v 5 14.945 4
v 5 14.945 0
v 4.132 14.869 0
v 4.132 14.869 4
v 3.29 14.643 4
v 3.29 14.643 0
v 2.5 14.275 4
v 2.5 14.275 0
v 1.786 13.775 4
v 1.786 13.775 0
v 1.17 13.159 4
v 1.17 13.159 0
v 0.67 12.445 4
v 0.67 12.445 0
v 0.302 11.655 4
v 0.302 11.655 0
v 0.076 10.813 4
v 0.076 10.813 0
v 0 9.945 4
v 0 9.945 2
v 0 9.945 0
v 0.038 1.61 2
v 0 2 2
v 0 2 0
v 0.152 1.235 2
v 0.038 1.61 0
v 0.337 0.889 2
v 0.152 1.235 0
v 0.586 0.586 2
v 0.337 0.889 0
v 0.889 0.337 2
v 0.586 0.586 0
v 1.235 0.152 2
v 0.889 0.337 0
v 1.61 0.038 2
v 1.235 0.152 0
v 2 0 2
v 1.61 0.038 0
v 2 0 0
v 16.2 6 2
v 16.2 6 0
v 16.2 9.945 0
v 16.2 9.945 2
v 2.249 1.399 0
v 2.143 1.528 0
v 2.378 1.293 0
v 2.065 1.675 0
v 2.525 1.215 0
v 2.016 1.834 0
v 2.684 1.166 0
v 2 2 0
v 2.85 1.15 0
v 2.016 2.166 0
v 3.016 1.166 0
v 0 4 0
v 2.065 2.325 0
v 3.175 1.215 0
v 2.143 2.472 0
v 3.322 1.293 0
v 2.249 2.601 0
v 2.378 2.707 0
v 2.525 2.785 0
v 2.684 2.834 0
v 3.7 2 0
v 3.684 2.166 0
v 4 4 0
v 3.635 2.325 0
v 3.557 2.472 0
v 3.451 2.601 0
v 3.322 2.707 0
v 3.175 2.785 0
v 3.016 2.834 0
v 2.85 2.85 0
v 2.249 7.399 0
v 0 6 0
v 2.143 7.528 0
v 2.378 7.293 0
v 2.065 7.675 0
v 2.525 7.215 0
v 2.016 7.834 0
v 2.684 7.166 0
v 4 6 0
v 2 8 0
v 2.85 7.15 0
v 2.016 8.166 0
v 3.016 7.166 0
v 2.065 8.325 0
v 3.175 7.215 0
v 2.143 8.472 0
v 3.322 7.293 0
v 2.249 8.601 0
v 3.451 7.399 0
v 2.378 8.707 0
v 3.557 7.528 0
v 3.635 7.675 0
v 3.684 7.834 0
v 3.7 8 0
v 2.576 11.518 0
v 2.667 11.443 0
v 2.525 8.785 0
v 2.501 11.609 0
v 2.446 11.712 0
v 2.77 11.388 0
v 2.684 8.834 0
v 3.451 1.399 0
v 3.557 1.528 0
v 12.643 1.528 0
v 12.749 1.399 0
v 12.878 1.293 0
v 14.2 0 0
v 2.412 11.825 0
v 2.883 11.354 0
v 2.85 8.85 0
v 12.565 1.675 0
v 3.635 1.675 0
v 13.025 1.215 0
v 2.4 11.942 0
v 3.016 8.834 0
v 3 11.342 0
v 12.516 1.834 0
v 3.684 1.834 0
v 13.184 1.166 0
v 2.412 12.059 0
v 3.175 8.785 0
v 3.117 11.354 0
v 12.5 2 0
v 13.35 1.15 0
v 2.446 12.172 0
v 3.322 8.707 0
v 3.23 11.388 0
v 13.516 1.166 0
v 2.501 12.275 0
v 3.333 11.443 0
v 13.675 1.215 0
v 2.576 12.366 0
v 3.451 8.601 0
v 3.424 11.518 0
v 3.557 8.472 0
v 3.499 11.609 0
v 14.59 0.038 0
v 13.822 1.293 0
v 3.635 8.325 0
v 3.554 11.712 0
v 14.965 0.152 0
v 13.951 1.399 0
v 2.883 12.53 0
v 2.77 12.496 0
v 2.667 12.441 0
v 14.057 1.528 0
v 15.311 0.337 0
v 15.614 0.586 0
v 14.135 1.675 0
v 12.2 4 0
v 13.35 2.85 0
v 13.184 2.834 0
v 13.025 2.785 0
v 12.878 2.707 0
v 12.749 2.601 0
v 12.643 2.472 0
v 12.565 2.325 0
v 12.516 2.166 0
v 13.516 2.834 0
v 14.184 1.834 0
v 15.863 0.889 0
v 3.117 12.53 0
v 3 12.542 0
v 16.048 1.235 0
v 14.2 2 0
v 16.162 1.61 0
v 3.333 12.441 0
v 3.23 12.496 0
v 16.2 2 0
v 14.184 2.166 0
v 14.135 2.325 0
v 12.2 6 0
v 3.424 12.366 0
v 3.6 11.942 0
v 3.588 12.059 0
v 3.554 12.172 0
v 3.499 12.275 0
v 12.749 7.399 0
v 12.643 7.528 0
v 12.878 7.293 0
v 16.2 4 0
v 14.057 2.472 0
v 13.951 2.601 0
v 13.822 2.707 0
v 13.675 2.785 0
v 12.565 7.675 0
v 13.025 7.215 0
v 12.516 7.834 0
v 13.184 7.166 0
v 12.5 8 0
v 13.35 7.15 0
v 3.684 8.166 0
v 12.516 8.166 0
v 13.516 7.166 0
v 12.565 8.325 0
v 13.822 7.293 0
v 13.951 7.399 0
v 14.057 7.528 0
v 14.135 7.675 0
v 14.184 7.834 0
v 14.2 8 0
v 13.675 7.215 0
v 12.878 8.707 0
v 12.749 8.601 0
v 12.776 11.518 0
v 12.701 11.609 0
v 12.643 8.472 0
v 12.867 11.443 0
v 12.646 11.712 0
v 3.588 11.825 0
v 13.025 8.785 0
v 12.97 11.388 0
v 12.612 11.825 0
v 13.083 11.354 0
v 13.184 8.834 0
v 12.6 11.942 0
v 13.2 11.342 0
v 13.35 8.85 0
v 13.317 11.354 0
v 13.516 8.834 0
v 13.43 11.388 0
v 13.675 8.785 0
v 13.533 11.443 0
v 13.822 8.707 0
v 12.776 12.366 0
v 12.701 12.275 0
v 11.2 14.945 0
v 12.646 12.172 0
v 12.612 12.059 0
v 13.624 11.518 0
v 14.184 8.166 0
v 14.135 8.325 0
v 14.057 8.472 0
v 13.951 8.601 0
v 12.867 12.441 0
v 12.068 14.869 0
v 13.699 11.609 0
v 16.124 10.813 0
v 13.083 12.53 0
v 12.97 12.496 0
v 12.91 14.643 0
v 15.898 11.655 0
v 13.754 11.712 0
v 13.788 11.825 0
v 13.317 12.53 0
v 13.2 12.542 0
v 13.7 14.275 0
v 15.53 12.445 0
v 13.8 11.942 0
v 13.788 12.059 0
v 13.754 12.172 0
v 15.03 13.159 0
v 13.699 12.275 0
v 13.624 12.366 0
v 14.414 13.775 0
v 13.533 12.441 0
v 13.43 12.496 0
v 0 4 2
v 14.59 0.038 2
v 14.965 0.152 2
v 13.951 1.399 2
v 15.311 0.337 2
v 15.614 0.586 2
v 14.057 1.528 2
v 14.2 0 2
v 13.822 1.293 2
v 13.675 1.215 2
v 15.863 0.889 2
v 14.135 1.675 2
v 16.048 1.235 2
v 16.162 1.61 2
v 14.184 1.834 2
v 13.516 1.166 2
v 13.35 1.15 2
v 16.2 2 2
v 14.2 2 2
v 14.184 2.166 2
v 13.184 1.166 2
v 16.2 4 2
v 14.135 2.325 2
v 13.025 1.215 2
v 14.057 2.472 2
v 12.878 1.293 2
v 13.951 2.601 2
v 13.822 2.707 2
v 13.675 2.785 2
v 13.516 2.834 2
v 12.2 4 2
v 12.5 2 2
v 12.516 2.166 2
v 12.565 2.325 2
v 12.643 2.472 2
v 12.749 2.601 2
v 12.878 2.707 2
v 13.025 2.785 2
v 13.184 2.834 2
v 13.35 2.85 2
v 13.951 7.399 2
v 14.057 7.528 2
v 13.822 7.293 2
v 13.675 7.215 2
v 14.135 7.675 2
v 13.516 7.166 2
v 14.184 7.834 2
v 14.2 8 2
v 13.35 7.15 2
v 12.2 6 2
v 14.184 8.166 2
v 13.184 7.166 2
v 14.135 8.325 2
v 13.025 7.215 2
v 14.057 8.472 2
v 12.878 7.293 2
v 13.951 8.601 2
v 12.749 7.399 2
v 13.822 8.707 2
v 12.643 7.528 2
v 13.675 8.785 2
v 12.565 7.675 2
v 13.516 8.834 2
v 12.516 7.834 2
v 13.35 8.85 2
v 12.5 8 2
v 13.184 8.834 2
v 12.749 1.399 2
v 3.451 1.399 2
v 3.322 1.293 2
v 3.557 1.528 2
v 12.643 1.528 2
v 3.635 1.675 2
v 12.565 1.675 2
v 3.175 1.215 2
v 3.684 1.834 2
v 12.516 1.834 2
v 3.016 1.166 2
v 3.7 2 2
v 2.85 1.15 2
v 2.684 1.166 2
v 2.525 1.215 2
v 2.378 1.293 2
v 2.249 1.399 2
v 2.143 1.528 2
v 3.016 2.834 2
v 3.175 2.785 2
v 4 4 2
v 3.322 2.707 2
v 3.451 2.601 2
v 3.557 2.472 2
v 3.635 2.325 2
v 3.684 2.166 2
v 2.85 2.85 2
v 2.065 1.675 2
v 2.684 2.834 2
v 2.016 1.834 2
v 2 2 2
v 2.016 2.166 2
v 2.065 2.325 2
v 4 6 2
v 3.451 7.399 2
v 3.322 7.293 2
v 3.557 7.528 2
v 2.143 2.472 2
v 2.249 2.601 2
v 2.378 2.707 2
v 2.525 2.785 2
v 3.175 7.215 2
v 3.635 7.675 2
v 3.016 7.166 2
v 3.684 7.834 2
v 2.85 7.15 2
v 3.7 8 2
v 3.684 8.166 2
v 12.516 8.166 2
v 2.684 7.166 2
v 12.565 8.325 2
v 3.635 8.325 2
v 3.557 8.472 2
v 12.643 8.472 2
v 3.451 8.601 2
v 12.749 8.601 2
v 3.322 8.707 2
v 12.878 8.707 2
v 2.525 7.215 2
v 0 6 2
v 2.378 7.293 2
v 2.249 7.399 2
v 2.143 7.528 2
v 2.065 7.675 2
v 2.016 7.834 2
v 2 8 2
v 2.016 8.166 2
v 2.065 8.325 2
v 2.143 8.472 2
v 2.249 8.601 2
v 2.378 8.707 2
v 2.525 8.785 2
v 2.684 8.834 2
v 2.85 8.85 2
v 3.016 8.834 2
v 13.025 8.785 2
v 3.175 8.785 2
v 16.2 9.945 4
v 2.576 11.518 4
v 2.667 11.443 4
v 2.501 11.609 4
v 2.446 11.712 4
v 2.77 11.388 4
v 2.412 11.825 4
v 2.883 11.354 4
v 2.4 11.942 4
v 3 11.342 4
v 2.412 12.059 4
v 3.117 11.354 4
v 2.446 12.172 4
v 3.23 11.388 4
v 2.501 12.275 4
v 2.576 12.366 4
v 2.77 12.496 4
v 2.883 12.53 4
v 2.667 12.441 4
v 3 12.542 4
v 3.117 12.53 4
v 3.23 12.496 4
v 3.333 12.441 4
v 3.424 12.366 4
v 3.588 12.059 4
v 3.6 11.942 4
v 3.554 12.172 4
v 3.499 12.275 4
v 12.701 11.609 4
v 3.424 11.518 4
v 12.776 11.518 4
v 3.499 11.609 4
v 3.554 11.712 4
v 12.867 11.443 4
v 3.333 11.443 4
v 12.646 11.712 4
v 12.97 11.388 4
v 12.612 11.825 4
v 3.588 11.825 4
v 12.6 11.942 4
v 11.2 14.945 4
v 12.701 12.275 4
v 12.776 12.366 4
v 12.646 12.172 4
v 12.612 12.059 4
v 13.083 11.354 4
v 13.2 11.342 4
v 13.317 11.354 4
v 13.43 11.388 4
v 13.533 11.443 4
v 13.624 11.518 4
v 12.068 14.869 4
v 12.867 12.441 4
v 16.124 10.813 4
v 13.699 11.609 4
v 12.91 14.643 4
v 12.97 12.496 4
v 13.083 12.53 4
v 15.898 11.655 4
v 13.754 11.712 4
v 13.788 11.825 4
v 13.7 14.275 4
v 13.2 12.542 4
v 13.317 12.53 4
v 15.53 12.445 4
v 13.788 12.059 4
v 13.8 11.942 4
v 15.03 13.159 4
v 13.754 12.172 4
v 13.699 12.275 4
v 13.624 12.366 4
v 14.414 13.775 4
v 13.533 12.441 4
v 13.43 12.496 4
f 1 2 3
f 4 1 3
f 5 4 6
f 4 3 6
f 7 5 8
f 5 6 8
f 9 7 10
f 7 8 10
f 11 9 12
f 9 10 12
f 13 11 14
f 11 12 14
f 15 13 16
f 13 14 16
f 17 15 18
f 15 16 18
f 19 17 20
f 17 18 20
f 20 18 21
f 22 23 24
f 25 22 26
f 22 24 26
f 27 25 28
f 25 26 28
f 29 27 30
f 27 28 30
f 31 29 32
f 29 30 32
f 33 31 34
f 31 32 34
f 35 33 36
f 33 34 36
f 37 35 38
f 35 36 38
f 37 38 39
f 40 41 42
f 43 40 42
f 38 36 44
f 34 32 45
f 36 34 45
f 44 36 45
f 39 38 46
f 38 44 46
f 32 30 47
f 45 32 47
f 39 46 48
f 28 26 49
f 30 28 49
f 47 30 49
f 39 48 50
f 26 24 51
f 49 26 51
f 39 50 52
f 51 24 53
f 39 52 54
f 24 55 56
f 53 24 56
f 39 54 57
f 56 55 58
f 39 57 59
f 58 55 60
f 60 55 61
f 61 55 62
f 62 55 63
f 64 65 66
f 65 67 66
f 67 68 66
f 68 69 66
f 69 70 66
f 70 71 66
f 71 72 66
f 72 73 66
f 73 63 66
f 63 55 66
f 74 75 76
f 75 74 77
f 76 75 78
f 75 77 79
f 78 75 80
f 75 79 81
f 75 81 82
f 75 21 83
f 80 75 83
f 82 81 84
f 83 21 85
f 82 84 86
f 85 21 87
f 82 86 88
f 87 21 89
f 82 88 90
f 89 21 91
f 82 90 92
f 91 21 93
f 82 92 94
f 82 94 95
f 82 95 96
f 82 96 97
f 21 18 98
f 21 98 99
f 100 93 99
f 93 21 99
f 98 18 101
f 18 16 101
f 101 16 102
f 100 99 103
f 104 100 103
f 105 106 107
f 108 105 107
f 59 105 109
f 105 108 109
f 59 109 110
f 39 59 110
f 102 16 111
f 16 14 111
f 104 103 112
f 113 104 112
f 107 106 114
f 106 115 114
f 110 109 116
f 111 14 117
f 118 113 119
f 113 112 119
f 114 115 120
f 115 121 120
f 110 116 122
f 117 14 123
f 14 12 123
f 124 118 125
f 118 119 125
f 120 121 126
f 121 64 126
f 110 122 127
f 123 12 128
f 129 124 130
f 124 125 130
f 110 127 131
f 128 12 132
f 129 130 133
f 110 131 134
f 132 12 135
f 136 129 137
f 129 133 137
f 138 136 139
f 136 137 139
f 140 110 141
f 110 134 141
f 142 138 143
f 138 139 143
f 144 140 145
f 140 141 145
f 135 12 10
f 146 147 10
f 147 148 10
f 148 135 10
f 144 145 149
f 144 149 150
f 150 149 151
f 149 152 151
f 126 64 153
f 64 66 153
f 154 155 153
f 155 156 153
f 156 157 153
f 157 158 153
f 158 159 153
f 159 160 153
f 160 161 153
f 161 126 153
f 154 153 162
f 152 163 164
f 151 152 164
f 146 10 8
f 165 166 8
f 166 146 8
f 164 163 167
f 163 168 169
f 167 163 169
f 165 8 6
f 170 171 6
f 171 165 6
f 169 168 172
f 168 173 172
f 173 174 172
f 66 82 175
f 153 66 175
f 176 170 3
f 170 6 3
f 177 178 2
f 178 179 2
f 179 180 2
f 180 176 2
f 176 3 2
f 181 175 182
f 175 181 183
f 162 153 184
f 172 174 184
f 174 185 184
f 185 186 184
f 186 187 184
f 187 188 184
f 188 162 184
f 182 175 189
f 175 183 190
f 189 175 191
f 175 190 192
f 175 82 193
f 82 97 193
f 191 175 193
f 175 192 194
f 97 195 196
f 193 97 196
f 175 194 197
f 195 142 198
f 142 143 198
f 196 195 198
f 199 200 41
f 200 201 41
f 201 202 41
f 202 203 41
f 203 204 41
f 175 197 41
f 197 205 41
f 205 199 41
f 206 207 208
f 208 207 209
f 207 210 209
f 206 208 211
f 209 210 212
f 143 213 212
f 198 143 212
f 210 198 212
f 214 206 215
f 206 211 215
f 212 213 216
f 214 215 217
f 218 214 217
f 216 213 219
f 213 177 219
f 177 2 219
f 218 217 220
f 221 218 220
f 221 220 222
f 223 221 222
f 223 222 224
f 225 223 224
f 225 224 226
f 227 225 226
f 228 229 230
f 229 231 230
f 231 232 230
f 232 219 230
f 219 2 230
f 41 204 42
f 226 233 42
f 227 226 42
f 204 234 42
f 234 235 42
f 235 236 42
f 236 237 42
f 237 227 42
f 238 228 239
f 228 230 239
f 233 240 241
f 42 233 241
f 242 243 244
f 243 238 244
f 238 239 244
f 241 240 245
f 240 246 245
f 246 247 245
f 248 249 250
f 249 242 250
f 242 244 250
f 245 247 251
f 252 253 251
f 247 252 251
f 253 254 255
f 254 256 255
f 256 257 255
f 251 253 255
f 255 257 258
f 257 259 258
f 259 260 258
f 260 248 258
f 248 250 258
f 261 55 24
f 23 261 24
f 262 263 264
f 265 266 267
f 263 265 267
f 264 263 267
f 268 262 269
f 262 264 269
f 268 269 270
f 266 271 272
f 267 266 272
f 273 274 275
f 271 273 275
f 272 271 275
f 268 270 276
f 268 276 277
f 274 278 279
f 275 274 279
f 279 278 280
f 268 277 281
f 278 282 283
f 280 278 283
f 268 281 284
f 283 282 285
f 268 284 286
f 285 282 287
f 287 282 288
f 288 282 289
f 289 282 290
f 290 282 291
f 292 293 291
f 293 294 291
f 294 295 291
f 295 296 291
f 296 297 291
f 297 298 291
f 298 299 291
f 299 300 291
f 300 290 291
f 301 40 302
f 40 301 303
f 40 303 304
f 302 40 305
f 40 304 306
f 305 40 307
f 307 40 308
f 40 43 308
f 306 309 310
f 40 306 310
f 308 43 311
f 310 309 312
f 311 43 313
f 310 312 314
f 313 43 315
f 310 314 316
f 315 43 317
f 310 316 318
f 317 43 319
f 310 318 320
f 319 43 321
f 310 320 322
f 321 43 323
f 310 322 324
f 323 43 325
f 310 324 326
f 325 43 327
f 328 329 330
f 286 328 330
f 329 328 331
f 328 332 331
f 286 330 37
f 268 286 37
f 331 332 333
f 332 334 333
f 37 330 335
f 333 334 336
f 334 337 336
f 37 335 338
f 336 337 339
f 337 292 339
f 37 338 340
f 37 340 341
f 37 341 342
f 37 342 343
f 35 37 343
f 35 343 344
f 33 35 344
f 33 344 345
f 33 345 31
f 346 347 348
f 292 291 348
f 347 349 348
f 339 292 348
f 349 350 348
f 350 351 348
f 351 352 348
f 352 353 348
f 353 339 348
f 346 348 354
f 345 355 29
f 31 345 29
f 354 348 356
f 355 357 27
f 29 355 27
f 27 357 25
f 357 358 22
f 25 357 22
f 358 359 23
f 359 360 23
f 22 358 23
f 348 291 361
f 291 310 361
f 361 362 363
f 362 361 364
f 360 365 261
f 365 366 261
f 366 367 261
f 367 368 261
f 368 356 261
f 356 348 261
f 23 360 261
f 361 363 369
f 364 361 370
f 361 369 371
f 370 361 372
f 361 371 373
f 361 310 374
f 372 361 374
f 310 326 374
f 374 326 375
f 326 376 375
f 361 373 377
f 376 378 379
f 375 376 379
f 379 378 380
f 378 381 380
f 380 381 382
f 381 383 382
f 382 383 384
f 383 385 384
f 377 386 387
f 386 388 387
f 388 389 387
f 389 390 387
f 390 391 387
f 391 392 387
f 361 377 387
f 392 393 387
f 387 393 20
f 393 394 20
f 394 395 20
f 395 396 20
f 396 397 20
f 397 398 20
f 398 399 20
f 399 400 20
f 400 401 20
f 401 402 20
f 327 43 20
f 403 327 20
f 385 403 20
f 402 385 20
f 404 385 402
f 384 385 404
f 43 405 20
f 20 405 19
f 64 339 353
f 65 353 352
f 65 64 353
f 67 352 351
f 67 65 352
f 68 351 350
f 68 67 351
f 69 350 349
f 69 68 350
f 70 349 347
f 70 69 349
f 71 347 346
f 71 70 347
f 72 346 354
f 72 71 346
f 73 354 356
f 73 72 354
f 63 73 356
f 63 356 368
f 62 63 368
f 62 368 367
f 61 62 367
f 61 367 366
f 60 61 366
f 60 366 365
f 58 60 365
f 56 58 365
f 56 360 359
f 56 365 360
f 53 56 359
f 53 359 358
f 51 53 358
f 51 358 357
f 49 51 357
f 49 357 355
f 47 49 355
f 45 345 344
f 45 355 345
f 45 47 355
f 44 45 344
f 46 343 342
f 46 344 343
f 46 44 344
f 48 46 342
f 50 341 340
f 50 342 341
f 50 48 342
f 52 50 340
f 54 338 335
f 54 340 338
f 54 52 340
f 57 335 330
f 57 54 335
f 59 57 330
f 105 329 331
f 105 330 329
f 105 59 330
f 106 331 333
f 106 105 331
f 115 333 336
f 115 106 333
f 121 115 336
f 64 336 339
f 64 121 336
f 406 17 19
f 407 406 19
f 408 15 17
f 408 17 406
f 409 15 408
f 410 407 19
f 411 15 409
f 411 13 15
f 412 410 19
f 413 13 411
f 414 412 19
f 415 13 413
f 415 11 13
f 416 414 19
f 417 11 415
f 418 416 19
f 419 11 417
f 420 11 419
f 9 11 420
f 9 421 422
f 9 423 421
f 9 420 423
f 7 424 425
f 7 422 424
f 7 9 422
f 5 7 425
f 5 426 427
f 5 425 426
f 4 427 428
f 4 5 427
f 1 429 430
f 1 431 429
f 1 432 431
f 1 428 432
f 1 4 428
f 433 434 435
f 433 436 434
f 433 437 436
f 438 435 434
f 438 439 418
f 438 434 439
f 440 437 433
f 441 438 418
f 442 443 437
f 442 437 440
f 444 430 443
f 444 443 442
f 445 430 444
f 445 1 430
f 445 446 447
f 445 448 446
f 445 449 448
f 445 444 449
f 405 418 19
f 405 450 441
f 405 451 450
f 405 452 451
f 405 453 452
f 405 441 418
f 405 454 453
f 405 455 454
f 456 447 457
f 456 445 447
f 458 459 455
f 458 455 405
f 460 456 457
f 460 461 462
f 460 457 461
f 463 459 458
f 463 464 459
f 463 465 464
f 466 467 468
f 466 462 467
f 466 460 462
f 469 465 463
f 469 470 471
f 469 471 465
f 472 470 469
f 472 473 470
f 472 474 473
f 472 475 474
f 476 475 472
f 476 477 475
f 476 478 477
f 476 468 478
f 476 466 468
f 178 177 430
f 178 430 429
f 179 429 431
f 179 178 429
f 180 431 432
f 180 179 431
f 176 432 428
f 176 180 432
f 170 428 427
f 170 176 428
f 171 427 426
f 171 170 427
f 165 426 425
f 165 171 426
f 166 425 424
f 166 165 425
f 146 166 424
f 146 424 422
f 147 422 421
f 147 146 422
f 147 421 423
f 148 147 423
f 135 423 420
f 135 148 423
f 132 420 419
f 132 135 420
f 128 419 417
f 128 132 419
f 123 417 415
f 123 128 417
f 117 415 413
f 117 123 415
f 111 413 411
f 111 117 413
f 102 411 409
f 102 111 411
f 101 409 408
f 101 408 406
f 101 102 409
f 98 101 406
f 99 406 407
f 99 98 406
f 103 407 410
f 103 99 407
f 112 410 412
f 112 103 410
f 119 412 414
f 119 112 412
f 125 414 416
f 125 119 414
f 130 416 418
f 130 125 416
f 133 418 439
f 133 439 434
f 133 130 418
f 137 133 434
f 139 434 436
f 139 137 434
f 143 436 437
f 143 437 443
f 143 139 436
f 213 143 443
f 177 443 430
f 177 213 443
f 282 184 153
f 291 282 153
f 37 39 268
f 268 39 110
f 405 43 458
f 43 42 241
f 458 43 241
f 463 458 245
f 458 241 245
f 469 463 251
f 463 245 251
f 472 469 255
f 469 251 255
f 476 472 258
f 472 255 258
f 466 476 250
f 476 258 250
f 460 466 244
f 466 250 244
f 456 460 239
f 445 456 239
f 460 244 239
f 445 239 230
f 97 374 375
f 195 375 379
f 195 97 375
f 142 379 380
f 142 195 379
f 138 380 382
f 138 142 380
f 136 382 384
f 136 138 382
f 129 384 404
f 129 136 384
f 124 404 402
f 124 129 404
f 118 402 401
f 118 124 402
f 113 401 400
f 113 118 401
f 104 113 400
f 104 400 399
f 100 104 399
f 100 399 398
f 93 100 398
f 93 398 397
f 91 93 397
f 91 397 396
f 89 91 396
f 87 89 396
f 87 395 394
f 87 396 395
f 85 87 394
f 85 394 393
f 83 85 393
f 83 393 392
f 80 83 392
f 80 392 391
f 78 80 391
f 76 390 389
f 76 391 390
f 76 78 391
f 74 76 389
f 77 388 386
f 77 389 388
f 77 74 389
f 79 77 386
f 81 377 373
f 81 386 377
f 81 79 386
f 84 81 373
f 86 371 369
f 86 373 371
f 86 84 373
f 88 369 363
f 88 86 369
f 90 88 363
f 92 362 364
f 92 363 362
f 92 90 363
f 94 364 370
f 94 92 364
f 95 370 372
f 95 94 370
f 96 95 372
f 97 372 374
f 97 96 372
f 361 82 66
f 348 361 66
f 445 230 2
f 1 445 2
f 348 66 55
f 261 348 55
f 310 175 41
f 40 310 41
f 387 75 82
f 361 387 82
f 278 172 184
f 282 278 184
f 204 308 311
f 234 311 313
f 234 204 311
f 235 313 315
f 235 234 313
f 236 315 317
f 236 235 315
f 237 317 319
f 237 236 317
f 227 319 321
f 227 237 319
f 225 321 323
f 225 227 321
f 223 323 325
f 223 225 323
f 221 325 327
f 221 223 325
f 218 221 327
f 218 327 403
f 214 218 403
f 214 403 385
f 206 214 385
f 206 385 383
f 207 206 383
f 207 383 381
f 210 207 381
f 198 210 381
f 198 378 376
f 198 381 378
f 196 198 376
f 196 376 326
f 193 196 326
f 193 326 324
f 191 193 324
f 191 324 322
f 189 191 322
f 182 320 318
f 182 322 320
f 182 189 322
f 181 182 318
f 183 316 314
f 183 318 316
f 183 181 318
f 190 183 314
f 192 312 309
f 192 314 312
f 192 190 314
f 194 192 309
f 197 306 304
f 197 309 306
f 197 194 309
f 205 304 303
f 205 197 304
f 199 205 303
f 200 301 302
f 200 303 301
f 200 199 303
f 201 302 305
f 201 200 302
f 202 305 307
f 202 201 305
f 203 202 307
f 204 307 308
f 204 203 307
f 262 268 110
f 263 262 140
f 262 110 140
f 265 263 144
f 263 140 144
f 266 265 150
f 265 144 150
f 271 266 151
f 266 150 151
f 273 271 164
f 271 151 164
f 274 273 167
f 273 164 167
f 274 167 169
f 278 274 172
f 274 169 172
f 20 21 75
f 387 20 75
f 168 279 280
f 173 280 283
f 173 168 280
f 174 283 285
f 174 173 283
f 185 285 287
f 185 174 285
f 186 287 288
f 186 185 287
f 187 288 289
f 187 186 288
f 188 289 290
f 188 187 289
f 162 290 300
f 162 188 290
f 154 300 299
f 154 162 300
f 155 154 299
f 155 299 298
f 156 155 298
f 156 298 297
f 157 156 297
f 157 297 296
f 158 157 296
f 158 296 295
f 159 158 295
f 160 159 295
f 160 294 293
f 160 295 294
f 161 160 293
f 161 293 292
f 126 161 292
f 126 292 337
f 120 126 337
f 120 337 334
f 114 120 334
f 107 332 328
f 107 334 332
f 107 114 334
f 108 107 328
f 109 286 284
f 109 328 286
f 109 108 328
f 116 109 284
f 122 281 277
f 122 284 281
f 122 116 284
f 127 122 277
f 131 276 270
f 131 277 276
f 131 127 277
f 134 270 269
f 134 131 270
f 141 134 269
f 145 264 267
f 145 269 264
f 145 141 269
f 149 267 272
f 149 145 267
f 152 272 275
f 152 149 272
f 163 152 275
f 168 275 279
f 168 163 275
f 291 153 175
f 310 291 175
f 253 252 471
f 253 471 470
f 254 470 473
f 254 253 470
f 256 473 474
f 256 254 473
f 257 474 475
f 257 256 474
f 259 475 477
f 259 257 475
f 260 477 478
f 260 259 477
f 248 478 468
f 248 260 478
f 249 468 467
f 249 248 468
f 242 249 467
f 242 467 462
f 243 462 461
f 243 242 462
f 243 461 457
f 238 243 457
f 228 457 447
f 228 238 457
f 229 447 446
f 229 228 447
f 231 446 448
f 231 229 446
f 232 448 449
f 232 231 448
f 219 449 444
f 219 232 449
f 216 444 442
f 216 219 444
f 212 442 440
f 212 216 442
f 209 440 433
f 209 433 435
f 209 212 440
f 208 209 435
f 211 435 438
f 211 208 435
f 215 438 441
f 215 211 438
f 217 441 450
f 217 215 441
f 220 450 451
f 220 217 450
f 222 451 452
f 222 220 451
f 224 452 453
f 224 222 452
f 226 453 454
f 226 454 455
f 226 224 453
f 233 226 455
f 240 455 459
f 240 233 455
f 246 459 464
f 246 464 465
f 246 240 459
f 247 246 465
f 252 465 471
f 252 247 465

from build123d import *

# Parameters (mm, degrees)
SKETCH2_R           = 0.85
SKETCH2_R_2         = 0.6
BOSS_EXTRUDE1_DEPTH = 4
SKETCH3_W           = 16.2
SKETCH3_H           = 9.945
CUT_EXTRUDE2_DEPTH  = 2


with BuildPart() as part:
    # Sketch2 → Boss-Extrude1 (new body)
    with BuildSketch(Plane.XY):
        with BuildLine():
            Line((0, 9.945), (0, 6))
            Line((0, 6), (4, 6))
            Line((4, 6), (4, 4))
            Line((4, 4), (0, 4))
            Line((0, 4), (0, 2))
            ThreePointArc((0, 2), (0.585786438, 0.585786438), (2, 0))
            Line((2, 0), (14.2, 0))
            ThreePointArc((14.2, 0), (15.614213562, 0.585786438), (16.2, 2))
            Line((16.2, 2), (16.2, 4))
            Line((16.2, 4), (12.2, 4))
            Line((12.2, 4), (12.2, 6))
            Line((12.2, 6), (16.2, 6))
            Line((16.2, 6), (16.2, 9.945))
            ThreePointArc((16.2, 9.945), (14.735533906, 13.480533906), (11.2, 14.945))
            Line((11.2, 14.945), (5, 14.945))
            ThreePointArc((5, 14.945), (1.464466094, 13.480533906), (0, 9.945))
        make_face()
        with Locations((13.35, 8)):
            Circle(SKETCH2_R, mode=Mode.SUBTRACT)
        with Locations((13.35, 2)):
            Circle(SKETCH2_R, mode=Mode.SUBTRACT)
        with Locations((13.2, 11.942)):
            Circle(SKETCH2_R_2, mode=Mode.SUBTRACT)
        with Locations((3, 11.942)):
            Circle(SKETCH2_R_2, mode=Mode.SUBTRACT)
        with Locations((2.85, 2)):
            Circle(SKETCH2_R, mode=Mode.SUBTRACT)
        with Locations((2.85, 8)):
            Circle(SKETCH2_R, mode=Mode.SUBTRACT)
    extrude(amount=BOSS_EXTRUDE1_DEPTH)

    # Sketch3 → Cut-Extrude2 (cut)
    with BuildSketch(Plane(origin=(0, 0, 4), x_dir=(-1, 0, 0), z_dir=(0, 0, -1))):
        with Locations((-8.1, 4.9725)):
            Rectangle(SKETCH3_W, SKETCH3_H)
    extrude(amount=CUT_EXTRUDE2_DEPTH, mode=Mode.SUBTRACT)


solid = part.part
